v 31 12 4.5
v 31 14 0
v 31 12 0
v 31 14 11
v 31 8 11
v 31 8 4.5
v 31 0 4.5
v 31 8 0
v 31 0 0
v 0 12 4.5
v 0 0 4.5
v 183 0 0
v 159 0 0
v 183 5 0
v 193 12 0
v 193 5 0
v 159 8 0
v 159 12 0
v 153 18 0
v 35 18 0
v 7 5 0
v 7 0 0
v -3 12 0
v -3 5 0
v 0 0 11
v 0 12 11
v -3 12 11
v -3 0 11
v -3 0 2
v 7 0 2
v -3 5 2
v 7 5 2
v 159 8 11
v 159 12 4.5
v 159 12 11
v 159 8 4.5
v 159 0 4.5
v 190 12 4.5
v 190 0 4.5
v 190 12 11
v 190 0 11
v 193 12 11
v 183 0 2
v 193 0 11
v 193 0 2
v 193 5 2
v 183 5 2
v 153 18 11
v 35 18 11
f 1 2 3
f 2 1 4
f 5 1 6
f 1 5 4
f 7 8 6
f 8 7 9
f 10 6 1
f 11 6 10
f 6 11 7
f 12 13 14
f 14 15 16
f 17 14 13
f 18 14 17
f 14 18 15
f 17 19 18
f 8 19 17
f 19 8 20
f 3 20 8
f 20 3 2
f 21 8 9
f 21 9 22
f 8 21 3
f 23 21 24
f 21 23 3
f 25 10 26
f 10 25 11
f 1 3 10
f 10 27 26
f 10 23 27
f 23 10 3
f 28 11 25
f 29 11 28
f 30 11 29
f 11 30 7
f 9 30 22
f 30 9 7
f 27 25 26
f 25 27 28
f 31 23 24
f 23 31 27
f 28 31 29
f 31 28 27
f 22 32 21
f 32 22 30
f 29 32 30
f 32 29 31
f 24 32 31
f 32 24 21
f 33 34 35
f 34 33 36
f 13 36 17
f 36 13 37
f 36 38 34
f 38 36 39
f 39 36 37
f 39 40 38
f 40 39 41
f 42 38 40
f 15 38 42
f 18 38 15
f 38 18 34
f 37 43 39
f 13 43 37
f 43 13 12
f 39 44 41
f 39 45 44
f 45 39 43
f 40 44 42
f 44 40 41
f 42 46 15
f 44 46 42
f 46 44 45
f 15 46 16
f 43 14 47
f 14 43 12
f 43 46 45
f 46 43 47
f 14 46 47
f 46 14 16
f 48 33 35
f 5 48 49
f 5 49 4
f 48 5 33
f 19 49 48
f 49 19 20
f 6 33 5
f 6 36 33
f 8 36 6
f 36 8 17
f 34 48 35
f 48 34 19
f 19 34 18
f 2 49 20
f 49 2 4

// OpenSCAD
/*
Orientation: looking at back of knitting head is Y axis.
X-> width
Y-> depth
Z-> height

*/
//SG => Sensor Gaurd
GaurdDepth = 8;
ShellDepth =  2;
FullCavetyDepth = 10;
Cavety1Width = 31;
Cavety1Height = 5-0.5;
// Cavety2Width = 51;
Cavety2Height = 11;
Cavety3Width = 128;
// Cavety3Height = 5;
SlitWidth = 3;
//SH => Screw Head
SH_Height = 2;
SH_Width = 10;
SH_depth = 5;
SmSH_Height = 1;
SmSH_Width =2;

Build("basic");
// trangle(10,10);
module Build(args) {
    if(args == "tabs")
    {
        CavetyOne("right");
        
        translate([Cavety1Width + 40,0,0])
        CavetyOne("left");
    }
    else
    {
        basic();
    }
    
}

module basic()
{
        difference()
        {
            union()
            {    
                CavetyOne();

                translate([Cavety1Width,FullCavetyDepth-ShellDepth,0])
                cube([Cavety3Width, GaurdDepth + ShellDepth, Cavety2Height], center=false);

                translate([2 * Cavety1Width + Cavety3Width,0,0])
                CavetyOne("left");
            }
            translate([ Cavety3Width + Cavety1Width, GaurdDepth + ShellDepth + FullCavetyDepth, 0])
            rotate([0,0,180])
            trangle(GaurdDepth, Cavety2Height);

            translate([ Cavety1Width + GaurdDepth - GaurdDepth, 2 * FullCavetyDepth + 2 , Cavety2Height])
            rotate([180,0,0])
            trangle(GaurdDepth, Cavety2Height);
            
        }


}

module trangle(side, depth)
{
    echo(side = side, depth = depth);
    linear_extrude(height = depth)
    polygon(points=[[0,0],[side,0],[0,side]]);
}

module CavetyOne(side)
{

    if(side == "left") 
    {
        mirror([1, 0, 0]) EndTab();
    }
    else
    {
        EndTab();
    }
}

module EndTab()
{
    difference()
    {    
        union()
        {    
            cube([Cavety1Width, FullCavetyDepth+ShellDepth, Cavety1Height], center=false);
            translate([- SlitWidth, 0, 0])
            cube(size=[SlitWidth, FullCavetyDepth+ShellDepth, Cavety2Height], center=false);

        }
        translate([- SlitWidth,0,0])
        ScrewHeadInsert(FullCavetyDepth - SH_depth);
        translate([2,0,0])
        SmallScrewHeadInsert(FullCavetyDepth - SH_depth);
        }
}

module ScrewHeadInsert(depth) 
{
    cube(size=[SH_Width, depth, SH_Height]);
}

module SmallScrewHeadInsert(depth)
{
    cube(size=[SmSH_Width, depth, SmSH_Height]);
}
